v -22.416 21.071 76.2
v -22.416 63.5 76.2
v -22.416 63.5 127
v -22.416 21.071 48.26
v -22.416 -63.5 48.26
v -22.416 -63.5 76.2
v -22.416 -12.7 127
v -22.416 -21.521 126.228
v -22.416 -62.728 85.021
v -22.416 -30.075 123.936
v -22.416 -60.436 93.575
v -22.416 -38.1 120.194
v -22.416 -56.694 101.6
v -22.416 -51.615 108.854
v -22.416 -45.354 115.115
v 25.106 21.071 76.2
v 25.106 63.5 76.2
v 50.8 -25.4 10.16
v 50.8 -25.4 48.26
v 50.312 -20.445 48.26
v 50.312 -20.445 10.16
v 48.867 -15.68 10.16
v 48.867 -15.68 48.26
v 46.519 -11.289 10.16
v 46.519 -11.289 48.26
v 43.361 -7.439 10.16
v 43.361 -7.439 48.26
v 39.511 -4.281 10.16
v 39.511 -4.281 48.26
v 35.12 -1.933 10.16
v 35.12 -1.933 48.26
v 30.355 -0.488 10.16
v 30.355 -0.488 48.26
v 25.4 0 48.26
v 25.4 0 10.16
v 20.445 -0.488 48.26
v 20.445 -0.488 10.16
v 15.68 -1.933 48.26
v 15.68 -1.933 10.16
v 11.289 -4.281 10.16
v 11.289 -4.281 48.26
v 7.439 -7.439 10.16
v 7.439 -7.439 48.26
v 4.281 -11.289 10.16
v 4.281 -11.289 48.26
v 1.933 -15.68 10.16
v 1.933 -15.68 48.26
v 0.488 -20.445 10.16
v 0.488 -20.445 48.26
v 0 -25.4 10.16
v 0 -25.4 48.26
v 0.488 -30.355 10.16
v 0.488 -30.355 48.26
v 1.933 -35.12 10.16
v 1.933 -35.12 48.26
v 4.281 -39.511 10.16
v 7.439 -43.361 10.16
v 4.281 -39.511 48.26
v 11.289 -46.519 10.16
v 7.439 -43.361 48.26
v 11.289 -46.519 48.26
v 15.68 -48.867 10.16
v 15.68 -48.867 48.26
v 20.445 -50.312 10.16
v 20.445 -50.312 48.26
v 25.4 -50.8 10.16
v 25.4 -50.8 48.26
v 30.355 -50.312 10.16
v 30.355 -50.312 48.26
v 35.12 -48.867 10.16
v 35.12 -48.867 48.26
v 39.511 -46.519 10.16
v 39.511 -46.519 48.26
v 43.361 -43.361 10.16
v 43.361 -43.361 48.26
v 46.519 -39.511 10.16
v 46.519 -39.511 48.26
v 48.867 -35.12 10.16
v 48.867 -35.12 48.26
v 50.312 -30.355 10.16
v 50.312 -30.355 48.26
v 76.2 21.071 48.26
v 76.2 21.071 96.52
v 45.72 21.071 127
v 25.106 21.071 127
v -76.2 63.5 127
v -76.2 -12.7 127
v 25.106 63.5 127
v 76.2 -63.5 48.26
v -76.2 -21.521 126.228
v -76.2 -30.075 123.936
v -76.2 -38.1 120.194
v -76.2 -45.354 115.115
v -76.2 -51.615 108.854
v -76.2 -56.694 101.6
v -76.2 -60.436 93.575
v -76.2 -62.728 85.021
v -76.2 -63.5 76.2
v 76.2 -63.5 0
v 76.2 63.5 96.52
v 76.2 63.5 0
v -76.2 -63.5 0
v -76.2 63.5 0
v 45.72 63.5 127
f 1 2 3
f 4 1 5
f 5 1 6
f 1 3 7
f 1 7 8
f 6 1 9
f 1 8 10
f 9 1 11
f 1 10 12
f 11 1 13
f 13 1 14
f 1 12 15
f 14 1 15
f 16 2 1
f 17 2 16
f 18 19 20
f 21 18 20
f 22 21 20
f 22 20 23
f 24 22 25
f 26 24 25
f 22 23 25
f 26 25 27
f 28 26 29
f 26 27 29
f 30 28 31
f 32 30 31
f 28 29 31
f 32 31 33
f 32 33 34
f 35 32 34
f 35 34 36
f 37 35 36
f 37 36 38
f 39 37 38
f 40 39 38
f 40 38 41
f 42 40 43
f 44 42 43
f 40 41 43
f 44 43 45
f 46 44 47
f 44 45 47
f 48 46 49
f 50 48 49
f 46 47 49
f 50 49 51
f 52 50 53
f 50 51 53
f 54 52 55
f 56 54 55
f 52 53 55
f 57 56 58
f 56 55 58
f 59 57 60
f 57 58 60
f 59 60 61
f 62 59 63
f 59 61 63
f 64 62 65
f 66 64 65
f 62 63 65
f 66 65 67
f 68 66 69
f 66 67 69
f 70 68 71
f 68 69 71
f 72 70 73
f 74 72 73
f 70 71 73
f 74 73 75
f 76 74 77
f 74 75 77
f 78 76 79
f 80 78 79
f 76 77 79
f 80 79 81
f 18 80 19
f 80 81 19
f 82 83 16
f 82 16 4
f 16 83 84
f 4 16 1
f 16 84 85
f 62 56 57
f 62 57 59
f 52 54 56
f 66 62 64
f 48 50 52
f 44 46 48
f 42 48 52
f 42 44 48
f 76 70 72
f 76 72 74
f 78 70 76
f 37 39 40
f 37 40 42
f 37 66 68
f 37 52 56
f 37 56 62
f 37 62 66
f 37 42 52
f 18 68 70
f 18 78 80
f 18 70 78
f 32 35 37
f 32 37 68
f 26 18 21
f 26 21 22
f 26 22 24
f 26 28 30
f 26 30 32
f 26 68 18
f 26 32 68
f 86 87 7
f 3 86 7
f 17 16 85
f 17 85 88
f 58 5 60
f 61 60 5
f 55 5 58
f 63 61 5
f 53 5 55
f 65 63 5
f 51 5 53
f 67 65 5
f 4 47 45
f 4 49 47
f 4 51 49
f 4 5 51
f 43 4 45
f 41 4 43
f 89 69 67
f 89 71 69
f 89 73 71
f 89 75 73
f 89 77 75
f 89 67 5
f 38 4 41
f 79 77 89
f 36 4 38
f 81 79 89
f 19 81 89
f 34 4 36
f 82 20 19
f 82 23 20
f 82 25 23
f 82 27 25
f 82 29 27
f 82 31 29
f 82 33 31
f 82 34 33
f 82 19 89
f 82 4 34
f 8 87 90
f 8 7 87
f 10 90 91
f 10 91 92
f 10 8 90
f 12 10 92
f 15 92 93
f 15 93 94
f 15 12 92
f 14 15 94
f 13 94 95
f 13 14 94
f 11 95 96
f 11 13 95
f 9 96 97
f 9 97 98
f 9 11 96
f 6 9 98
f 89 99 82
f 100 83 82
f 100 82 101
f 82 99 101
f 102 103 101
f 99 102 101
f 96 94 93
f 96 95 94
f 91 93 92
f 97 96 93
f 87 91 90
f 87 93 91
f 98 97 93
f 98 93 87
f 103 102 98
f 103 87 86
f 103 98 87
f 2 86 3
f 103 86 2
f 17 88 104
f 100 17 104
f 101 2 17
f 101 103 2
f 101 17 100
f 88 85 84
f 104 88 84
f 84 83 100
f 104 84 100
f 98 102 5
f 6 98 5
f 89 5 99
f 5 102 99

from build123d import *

# Parameters (mm, degrees)
F0_W     = 152.4
F0_H     = 127
F1_DEPTH = 127
F3_DEPTH = 78.74
F2_W     = 47.5228335708
F2_H     = 42.4285548031
F4_DEPTH = 50.8
F5_SIZE  = 30.48
F6_R     = 25.4
F7_DEPTH = 38.1
F8_R     = 50.8


with BuildPart() as f1:
    # F0 (on Top) → F1 (new body)
    with BuildSketch(Plane.XY):
        Rectangle(F0_W, F0_H)
    extrude(amount=F1_DEPTH)

    # F2 (on face) → F3 (cut)
    with BuildSketch(Plane.XY.offset(127)):
        Polygon((-22.4164314568, -24.2097526789), (-22.4164314568, -63.5), (76.2, -63.5), (76.2, 21.0714451969), (40.7979153097, 21.0714451969), (25.106402114, 21.0714451969), (-22.4164314568, 21.0714451969), align=None)
    extrude(amount=-F3_DEPTH, mode=Mode.SUBTRACT)

    # F2 (on face) → F4 (cut)
    with BuildSketch(Plane.XY.offset(127)):
        with Locations((1.3449853286, 42.2857225984)):
            Rectangle(F2_W, F2_H)
    extrude(amount=-F4_DEPTH, mode=Mode.SUBTRACT)

    # F5
    f5_edges = [f1.edges().sort_by_distance(p)[0] for p in [
        (76.2, 42.285723, 127),
    ]]
    chamfer(f5_edges, length=F5_SIZE)

    # F6 (on face) → F7 (cut)
    with BuildSketch(Plane.XY.offset(48.26)):
        with Locations((25.4, -25.4)):
            Circle(F6_R)
    extrude(amount=-F7_DEPTH, mode=Mode.SUBTRACT)

    # F8
    f8_edges = [f1.edges().sort_by_distance(p)[0] for p in [
        (-49.308216, -63.5, 127),
    ]]
    fillet(f8_edges, radius=F8_R)


solid = f1.part
